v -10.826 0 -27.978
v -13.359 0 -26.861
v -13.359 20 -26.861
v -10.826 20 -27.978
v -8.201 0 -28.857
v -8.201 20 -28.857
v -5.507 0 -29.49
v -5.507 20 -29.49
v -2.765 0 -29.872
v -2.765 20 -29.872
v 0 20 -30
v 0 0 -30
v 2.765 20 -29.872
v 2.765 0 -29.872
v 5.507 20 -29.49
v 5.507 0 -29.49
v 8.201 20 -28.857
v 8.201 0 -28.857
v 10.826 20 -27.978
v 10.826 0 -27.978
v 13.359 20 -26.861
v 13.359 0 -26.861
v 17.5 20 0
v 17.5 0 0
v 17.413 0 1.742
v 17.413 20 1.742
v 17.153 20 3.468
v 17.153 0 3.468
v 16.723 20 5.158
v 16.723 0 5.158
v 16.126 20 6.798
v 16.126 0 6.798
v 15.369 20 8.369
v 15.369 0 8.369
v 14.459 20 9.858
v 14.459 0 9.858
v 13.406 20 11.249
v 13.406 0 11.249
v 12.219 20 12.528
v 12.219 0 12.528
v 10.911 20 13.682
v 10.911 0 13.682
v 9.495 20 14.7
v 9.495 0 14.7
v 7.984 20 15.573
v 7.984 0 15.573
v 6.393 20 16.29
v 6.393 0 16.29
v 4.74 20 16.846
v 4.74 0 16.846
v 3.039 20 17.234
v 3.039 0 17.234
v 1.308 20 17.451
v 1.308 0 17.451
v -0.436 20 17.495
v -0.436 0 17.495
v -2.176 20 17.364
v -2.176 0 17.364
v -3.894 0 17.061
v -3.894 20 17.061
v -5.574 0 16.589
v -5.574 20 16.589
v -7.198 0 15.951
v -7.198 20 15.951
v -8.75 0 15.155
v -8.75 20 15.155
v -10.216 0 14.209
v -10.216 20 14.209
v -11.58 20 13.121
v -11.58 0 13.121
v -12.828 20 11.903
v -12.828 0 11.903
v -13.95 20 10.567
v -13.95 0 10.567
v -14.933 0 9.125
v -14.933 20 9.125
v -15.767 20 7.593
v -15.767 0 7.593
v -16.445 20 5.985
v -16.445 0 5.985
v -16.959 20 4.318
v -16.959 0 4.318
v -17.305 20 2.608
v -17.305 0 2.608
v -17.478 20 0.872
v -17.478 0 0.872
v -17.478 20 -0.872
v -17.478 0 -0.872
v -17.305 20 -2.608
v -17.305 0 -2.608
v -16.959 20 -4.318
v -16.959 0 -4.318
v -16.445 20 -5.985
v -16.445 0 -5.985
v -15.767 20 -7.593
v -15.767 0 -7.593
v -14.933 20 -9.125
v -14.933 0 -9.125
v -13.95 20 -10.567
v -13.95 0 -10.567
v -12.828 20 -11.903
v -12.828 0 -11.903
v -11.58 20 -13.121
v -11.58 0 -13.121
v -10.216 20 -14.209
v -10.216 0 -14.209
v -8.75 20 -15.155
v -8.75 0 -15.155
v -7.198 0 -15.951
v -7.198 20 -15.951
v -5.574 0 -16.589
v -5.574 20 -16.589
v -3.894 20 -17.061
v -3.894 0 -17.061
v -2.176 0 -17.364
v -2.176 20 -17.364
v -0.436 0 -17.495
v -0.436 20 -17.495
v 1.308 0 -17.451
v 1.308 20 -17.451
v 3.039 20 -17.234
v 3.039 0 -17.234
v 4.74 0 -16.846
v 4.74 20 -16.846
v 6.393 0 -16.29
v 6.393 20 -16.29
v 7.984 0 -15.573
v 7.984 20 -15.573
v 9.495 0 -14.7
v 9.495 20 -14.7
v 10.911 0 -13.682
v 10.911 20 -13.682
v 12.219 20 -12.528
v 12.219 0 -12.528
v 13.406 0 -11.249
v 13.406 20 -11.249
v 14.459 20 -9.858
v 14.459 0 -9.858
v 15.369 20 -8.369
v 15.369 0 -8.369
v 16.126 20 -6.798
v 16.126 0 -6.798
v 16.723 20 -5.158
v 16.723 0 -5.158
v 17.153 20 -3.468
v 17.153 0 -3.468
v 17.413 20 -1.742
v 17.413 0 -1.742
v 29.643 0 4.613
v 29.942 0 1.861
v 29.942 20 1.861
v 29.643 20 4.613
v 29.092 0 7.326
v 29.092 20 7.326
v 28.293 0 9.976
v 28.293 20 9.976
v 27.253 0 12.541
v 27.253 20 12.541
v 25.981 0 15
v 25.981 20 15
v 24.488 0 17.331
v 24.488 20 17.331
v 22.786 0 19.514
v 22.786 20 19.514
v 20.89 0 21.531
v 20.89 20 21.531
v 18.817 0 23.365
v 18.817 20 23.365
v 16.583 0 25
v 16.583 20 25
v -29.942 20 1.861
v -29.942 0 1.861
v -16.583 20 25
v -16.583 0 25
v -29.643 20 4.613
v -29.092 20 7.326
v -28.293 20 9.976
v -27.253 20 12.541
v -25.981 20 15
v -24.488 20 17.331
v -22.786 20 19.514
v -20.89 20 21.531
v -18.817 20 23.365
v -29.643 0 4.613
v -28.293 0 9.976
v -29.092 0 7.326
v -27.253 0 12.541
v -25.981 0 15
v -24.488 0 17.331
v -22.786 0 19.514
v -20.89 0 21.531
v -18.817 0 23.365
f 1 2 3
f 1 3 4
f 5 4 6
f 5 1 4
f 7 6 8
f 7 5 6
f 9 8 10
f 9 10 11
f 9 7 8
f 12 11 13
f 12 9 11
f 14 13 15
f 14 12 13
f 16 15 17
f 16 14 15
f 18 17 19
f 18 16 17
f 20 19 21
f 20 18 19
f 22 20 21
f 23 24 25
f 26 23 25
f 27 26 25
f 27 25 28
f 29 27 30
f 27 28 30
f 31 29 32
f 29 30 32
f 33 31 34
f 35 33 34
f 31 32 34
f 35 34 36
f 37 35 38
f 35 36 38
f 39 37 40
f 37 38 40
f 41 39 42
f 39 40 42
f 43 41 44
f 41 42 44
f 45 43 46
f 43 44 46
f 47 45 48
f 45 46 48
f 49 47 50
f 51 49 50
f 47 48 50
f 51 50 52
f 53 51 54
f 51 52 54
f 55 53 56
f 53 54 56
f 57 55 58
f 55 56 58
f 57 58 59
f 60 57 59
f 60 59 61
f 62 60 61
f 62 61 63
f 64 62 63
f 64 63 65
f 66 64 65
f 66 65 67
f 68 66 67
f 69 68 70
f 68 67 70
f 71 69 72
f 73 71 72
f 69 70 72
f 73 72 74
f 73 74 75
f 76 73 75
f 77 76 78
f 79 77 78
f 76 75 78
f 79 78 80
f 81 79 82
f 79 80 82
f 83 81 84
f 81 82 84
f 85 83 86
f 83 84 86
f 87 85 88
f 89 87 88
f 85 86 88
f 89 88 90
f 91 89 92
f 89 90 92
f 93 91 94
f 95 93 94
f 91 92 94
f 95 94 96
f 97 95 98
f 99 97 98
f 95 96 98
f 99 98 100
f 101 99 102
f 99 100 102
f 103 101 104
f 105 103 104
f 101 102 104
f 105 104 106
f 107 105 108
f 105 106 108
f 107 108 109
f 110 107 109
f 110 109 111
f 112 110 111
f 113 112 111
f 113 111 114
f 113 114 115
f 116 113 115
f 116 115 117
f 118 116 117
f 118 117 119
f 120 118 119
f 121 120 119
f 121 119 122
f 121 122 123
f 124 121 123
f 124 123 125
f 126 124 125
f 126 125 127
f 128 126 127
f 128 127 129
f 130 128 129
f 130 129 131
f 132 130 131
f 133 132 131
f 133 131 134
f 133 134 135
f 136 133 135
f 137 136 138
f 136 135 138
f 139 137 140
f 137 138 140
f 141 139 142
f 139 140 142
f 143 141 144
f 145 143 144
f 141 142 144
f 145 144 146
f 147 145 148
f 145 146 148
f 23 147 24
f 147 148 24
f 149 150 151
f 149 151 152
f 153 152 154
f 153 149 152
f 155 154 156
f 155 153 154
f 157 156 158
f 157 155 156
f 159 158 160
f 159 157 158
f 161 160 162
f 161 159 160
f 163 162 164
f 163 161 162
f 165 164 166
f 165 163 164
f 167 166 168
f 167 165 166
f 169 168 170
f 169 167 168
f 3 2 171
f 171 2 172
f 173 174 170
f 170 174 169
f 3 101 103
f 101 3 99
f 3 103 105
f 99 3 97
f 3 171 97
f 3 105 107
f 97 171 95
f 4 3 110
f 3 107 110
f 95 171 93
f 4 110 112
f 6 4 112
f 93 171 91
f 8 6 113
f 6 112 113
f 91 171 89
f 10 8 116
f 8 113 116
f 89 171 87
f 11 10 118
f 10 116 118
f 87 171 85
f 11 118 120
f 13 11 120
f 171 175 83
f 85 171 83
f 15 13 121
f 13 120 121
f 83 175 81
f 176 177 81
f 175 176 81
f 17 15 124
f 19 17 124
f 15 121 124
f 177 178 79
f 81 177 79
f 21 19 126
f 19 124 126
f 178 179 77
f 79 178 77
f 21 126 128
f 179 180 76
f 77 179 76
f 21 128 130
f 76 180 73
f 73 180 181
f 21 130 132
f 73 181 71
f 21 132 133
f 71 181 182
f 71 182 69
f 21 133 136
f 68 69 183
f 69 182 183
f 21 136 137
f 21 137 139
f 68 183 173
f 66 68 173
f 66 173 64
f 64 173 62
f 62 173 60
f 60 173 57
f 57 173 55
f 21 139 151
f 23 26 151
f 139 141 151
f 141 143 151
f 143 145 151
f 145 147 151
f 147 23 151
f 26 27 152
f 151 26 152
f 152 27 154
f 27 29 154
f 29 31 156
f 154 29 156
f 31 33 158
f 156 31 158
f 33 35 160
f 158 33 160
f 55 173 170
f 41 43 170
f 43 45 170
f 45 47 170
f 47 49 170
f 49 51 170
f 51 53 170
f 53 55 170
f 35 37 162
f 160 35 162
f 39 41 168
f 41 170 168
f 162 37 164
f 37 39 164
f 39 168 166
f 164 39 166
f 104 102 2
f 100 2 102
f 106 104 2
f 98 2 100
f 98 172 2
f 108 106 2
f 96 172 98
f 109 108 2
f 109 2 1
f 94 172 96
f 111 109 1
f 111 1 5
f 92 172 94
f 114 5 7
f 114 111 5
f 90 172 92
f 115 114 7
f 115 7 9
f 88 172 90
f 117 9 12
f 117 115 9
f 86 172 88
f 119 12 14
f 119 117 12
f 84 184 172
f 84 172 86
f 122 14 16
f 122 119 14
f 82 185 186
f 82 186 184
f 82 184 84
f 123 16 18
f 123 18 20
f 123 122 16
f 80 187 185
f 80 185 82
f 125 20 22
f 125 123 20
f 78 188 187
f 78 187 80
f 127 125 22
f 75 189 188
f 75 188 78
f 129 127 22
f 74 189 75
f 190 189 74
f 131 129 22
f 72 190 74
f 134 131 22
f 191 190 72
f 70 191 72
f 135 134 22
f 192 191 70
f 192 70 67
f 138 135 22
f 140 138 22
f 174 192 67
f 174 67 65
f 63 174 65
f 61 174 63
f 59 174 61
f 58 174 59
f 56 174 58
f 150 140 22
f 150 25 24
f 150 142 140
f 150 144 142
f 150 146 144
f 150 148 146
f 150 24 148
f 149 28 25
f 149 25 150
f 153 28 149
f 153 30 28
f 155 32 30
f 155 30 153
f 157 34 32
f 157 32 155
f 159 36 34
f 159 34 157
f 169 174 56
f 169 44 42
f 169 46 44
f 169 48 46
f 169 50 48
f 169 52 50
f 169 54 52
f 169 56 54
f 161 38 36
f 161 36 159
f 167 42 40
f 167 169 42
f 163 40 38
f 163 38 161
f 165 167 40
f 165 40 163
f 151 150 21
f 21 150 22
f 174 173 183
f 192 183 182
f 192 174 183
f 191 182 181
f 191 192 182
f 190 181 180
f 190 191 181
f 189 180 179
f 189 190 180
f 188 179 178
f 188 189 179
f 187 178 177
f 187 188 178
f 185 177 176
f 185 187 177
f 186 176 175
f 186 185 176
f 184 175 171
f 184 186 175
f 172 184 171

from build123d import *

# Parameters (mm, degrees)
F0_R     = 30
F0_R_2   = 17.5
F1_DEPTH = 20
F2_R     = 100
F3_DEPTH = 20.001


with BuildPart() as f1:
    # F0 (on Front) → F1 (new body)
    with BuildSketch(Plane.XZ):
        Circle(F0_R)
        Circle(F0_R_2, mode=Mode.SUBTRACT)
    extrude(amount=-F1_DEPTH)

    # F2 (on face) → F3 (cut, through all)
    with BuildSketch(Plane.XZ):
        Circle(F2_R)
        with BuildLine():
            ThreePointArc((29.9421970705, 1.8614066163), (29.9855457856, 0.9311519438), (30, 0))
            ThreePointArc((30, 0), (25.5026684247, -15.7991741309), (13.3590731187, -26.8614066163))
            Line((13.3590731187, -26.8614066163), (0, -50))
            Line((0, -50), (-13.3590731187, -26.8614066163))
            ThreePointArc((-13.3590731187, -26.8614066163), (-25.9807621135, -15), (-29.9421970705, 1.8614066163))
            Line((-29.9421970705, 1.8614066163), (-43.3012701892, 25))
            Line((-43.3012701892, 25), (-16.5831239518, 25))
            ThreePointArc((-16.5831239518, 25), (0, 30), (16.5831239518, 25))
            Line((16.5831239518, 25), (43.3012701892, 25))
            Line((43.3012701892, 25), (29.9421970705, 1.8614066163))
        make_face(mode=Mode.SUBTRACT)
        with BuildLine():
            Line((-16.5831239518, 25), (16.5831239518, 25))
            ThreePointArc((16.5831239518, 25), (0, 30), (-16.5831239518, 25))
        make_face()
        with BuildLine():
            ThreePointArc((-29.9421970705, 1.8614066163), (-25.9807621135, -15), (-13.3590731187, -26.8614066163))
            Line((-13.3590731187, -26.8614066163), (-29.9421970705, 1.8614066163))
        make_face()
        with BuildLine():
            ThreePointArc((13.3590731187, -26.8614066163), (25.5026684247, -15.7991741309), (30, 0))
            ThreePointArc((30, 0), (29.9855457856, 0.9311519438), (29.9421970705, 1.8614066163))
            Line((29.9421970705, 1.8614066163), (13.3590731187, -26.8614066163))
        make_face()
    extrude(amount=-F3_DEPTH, mode=Mode.SUBTRACT)


solid = f1.part
